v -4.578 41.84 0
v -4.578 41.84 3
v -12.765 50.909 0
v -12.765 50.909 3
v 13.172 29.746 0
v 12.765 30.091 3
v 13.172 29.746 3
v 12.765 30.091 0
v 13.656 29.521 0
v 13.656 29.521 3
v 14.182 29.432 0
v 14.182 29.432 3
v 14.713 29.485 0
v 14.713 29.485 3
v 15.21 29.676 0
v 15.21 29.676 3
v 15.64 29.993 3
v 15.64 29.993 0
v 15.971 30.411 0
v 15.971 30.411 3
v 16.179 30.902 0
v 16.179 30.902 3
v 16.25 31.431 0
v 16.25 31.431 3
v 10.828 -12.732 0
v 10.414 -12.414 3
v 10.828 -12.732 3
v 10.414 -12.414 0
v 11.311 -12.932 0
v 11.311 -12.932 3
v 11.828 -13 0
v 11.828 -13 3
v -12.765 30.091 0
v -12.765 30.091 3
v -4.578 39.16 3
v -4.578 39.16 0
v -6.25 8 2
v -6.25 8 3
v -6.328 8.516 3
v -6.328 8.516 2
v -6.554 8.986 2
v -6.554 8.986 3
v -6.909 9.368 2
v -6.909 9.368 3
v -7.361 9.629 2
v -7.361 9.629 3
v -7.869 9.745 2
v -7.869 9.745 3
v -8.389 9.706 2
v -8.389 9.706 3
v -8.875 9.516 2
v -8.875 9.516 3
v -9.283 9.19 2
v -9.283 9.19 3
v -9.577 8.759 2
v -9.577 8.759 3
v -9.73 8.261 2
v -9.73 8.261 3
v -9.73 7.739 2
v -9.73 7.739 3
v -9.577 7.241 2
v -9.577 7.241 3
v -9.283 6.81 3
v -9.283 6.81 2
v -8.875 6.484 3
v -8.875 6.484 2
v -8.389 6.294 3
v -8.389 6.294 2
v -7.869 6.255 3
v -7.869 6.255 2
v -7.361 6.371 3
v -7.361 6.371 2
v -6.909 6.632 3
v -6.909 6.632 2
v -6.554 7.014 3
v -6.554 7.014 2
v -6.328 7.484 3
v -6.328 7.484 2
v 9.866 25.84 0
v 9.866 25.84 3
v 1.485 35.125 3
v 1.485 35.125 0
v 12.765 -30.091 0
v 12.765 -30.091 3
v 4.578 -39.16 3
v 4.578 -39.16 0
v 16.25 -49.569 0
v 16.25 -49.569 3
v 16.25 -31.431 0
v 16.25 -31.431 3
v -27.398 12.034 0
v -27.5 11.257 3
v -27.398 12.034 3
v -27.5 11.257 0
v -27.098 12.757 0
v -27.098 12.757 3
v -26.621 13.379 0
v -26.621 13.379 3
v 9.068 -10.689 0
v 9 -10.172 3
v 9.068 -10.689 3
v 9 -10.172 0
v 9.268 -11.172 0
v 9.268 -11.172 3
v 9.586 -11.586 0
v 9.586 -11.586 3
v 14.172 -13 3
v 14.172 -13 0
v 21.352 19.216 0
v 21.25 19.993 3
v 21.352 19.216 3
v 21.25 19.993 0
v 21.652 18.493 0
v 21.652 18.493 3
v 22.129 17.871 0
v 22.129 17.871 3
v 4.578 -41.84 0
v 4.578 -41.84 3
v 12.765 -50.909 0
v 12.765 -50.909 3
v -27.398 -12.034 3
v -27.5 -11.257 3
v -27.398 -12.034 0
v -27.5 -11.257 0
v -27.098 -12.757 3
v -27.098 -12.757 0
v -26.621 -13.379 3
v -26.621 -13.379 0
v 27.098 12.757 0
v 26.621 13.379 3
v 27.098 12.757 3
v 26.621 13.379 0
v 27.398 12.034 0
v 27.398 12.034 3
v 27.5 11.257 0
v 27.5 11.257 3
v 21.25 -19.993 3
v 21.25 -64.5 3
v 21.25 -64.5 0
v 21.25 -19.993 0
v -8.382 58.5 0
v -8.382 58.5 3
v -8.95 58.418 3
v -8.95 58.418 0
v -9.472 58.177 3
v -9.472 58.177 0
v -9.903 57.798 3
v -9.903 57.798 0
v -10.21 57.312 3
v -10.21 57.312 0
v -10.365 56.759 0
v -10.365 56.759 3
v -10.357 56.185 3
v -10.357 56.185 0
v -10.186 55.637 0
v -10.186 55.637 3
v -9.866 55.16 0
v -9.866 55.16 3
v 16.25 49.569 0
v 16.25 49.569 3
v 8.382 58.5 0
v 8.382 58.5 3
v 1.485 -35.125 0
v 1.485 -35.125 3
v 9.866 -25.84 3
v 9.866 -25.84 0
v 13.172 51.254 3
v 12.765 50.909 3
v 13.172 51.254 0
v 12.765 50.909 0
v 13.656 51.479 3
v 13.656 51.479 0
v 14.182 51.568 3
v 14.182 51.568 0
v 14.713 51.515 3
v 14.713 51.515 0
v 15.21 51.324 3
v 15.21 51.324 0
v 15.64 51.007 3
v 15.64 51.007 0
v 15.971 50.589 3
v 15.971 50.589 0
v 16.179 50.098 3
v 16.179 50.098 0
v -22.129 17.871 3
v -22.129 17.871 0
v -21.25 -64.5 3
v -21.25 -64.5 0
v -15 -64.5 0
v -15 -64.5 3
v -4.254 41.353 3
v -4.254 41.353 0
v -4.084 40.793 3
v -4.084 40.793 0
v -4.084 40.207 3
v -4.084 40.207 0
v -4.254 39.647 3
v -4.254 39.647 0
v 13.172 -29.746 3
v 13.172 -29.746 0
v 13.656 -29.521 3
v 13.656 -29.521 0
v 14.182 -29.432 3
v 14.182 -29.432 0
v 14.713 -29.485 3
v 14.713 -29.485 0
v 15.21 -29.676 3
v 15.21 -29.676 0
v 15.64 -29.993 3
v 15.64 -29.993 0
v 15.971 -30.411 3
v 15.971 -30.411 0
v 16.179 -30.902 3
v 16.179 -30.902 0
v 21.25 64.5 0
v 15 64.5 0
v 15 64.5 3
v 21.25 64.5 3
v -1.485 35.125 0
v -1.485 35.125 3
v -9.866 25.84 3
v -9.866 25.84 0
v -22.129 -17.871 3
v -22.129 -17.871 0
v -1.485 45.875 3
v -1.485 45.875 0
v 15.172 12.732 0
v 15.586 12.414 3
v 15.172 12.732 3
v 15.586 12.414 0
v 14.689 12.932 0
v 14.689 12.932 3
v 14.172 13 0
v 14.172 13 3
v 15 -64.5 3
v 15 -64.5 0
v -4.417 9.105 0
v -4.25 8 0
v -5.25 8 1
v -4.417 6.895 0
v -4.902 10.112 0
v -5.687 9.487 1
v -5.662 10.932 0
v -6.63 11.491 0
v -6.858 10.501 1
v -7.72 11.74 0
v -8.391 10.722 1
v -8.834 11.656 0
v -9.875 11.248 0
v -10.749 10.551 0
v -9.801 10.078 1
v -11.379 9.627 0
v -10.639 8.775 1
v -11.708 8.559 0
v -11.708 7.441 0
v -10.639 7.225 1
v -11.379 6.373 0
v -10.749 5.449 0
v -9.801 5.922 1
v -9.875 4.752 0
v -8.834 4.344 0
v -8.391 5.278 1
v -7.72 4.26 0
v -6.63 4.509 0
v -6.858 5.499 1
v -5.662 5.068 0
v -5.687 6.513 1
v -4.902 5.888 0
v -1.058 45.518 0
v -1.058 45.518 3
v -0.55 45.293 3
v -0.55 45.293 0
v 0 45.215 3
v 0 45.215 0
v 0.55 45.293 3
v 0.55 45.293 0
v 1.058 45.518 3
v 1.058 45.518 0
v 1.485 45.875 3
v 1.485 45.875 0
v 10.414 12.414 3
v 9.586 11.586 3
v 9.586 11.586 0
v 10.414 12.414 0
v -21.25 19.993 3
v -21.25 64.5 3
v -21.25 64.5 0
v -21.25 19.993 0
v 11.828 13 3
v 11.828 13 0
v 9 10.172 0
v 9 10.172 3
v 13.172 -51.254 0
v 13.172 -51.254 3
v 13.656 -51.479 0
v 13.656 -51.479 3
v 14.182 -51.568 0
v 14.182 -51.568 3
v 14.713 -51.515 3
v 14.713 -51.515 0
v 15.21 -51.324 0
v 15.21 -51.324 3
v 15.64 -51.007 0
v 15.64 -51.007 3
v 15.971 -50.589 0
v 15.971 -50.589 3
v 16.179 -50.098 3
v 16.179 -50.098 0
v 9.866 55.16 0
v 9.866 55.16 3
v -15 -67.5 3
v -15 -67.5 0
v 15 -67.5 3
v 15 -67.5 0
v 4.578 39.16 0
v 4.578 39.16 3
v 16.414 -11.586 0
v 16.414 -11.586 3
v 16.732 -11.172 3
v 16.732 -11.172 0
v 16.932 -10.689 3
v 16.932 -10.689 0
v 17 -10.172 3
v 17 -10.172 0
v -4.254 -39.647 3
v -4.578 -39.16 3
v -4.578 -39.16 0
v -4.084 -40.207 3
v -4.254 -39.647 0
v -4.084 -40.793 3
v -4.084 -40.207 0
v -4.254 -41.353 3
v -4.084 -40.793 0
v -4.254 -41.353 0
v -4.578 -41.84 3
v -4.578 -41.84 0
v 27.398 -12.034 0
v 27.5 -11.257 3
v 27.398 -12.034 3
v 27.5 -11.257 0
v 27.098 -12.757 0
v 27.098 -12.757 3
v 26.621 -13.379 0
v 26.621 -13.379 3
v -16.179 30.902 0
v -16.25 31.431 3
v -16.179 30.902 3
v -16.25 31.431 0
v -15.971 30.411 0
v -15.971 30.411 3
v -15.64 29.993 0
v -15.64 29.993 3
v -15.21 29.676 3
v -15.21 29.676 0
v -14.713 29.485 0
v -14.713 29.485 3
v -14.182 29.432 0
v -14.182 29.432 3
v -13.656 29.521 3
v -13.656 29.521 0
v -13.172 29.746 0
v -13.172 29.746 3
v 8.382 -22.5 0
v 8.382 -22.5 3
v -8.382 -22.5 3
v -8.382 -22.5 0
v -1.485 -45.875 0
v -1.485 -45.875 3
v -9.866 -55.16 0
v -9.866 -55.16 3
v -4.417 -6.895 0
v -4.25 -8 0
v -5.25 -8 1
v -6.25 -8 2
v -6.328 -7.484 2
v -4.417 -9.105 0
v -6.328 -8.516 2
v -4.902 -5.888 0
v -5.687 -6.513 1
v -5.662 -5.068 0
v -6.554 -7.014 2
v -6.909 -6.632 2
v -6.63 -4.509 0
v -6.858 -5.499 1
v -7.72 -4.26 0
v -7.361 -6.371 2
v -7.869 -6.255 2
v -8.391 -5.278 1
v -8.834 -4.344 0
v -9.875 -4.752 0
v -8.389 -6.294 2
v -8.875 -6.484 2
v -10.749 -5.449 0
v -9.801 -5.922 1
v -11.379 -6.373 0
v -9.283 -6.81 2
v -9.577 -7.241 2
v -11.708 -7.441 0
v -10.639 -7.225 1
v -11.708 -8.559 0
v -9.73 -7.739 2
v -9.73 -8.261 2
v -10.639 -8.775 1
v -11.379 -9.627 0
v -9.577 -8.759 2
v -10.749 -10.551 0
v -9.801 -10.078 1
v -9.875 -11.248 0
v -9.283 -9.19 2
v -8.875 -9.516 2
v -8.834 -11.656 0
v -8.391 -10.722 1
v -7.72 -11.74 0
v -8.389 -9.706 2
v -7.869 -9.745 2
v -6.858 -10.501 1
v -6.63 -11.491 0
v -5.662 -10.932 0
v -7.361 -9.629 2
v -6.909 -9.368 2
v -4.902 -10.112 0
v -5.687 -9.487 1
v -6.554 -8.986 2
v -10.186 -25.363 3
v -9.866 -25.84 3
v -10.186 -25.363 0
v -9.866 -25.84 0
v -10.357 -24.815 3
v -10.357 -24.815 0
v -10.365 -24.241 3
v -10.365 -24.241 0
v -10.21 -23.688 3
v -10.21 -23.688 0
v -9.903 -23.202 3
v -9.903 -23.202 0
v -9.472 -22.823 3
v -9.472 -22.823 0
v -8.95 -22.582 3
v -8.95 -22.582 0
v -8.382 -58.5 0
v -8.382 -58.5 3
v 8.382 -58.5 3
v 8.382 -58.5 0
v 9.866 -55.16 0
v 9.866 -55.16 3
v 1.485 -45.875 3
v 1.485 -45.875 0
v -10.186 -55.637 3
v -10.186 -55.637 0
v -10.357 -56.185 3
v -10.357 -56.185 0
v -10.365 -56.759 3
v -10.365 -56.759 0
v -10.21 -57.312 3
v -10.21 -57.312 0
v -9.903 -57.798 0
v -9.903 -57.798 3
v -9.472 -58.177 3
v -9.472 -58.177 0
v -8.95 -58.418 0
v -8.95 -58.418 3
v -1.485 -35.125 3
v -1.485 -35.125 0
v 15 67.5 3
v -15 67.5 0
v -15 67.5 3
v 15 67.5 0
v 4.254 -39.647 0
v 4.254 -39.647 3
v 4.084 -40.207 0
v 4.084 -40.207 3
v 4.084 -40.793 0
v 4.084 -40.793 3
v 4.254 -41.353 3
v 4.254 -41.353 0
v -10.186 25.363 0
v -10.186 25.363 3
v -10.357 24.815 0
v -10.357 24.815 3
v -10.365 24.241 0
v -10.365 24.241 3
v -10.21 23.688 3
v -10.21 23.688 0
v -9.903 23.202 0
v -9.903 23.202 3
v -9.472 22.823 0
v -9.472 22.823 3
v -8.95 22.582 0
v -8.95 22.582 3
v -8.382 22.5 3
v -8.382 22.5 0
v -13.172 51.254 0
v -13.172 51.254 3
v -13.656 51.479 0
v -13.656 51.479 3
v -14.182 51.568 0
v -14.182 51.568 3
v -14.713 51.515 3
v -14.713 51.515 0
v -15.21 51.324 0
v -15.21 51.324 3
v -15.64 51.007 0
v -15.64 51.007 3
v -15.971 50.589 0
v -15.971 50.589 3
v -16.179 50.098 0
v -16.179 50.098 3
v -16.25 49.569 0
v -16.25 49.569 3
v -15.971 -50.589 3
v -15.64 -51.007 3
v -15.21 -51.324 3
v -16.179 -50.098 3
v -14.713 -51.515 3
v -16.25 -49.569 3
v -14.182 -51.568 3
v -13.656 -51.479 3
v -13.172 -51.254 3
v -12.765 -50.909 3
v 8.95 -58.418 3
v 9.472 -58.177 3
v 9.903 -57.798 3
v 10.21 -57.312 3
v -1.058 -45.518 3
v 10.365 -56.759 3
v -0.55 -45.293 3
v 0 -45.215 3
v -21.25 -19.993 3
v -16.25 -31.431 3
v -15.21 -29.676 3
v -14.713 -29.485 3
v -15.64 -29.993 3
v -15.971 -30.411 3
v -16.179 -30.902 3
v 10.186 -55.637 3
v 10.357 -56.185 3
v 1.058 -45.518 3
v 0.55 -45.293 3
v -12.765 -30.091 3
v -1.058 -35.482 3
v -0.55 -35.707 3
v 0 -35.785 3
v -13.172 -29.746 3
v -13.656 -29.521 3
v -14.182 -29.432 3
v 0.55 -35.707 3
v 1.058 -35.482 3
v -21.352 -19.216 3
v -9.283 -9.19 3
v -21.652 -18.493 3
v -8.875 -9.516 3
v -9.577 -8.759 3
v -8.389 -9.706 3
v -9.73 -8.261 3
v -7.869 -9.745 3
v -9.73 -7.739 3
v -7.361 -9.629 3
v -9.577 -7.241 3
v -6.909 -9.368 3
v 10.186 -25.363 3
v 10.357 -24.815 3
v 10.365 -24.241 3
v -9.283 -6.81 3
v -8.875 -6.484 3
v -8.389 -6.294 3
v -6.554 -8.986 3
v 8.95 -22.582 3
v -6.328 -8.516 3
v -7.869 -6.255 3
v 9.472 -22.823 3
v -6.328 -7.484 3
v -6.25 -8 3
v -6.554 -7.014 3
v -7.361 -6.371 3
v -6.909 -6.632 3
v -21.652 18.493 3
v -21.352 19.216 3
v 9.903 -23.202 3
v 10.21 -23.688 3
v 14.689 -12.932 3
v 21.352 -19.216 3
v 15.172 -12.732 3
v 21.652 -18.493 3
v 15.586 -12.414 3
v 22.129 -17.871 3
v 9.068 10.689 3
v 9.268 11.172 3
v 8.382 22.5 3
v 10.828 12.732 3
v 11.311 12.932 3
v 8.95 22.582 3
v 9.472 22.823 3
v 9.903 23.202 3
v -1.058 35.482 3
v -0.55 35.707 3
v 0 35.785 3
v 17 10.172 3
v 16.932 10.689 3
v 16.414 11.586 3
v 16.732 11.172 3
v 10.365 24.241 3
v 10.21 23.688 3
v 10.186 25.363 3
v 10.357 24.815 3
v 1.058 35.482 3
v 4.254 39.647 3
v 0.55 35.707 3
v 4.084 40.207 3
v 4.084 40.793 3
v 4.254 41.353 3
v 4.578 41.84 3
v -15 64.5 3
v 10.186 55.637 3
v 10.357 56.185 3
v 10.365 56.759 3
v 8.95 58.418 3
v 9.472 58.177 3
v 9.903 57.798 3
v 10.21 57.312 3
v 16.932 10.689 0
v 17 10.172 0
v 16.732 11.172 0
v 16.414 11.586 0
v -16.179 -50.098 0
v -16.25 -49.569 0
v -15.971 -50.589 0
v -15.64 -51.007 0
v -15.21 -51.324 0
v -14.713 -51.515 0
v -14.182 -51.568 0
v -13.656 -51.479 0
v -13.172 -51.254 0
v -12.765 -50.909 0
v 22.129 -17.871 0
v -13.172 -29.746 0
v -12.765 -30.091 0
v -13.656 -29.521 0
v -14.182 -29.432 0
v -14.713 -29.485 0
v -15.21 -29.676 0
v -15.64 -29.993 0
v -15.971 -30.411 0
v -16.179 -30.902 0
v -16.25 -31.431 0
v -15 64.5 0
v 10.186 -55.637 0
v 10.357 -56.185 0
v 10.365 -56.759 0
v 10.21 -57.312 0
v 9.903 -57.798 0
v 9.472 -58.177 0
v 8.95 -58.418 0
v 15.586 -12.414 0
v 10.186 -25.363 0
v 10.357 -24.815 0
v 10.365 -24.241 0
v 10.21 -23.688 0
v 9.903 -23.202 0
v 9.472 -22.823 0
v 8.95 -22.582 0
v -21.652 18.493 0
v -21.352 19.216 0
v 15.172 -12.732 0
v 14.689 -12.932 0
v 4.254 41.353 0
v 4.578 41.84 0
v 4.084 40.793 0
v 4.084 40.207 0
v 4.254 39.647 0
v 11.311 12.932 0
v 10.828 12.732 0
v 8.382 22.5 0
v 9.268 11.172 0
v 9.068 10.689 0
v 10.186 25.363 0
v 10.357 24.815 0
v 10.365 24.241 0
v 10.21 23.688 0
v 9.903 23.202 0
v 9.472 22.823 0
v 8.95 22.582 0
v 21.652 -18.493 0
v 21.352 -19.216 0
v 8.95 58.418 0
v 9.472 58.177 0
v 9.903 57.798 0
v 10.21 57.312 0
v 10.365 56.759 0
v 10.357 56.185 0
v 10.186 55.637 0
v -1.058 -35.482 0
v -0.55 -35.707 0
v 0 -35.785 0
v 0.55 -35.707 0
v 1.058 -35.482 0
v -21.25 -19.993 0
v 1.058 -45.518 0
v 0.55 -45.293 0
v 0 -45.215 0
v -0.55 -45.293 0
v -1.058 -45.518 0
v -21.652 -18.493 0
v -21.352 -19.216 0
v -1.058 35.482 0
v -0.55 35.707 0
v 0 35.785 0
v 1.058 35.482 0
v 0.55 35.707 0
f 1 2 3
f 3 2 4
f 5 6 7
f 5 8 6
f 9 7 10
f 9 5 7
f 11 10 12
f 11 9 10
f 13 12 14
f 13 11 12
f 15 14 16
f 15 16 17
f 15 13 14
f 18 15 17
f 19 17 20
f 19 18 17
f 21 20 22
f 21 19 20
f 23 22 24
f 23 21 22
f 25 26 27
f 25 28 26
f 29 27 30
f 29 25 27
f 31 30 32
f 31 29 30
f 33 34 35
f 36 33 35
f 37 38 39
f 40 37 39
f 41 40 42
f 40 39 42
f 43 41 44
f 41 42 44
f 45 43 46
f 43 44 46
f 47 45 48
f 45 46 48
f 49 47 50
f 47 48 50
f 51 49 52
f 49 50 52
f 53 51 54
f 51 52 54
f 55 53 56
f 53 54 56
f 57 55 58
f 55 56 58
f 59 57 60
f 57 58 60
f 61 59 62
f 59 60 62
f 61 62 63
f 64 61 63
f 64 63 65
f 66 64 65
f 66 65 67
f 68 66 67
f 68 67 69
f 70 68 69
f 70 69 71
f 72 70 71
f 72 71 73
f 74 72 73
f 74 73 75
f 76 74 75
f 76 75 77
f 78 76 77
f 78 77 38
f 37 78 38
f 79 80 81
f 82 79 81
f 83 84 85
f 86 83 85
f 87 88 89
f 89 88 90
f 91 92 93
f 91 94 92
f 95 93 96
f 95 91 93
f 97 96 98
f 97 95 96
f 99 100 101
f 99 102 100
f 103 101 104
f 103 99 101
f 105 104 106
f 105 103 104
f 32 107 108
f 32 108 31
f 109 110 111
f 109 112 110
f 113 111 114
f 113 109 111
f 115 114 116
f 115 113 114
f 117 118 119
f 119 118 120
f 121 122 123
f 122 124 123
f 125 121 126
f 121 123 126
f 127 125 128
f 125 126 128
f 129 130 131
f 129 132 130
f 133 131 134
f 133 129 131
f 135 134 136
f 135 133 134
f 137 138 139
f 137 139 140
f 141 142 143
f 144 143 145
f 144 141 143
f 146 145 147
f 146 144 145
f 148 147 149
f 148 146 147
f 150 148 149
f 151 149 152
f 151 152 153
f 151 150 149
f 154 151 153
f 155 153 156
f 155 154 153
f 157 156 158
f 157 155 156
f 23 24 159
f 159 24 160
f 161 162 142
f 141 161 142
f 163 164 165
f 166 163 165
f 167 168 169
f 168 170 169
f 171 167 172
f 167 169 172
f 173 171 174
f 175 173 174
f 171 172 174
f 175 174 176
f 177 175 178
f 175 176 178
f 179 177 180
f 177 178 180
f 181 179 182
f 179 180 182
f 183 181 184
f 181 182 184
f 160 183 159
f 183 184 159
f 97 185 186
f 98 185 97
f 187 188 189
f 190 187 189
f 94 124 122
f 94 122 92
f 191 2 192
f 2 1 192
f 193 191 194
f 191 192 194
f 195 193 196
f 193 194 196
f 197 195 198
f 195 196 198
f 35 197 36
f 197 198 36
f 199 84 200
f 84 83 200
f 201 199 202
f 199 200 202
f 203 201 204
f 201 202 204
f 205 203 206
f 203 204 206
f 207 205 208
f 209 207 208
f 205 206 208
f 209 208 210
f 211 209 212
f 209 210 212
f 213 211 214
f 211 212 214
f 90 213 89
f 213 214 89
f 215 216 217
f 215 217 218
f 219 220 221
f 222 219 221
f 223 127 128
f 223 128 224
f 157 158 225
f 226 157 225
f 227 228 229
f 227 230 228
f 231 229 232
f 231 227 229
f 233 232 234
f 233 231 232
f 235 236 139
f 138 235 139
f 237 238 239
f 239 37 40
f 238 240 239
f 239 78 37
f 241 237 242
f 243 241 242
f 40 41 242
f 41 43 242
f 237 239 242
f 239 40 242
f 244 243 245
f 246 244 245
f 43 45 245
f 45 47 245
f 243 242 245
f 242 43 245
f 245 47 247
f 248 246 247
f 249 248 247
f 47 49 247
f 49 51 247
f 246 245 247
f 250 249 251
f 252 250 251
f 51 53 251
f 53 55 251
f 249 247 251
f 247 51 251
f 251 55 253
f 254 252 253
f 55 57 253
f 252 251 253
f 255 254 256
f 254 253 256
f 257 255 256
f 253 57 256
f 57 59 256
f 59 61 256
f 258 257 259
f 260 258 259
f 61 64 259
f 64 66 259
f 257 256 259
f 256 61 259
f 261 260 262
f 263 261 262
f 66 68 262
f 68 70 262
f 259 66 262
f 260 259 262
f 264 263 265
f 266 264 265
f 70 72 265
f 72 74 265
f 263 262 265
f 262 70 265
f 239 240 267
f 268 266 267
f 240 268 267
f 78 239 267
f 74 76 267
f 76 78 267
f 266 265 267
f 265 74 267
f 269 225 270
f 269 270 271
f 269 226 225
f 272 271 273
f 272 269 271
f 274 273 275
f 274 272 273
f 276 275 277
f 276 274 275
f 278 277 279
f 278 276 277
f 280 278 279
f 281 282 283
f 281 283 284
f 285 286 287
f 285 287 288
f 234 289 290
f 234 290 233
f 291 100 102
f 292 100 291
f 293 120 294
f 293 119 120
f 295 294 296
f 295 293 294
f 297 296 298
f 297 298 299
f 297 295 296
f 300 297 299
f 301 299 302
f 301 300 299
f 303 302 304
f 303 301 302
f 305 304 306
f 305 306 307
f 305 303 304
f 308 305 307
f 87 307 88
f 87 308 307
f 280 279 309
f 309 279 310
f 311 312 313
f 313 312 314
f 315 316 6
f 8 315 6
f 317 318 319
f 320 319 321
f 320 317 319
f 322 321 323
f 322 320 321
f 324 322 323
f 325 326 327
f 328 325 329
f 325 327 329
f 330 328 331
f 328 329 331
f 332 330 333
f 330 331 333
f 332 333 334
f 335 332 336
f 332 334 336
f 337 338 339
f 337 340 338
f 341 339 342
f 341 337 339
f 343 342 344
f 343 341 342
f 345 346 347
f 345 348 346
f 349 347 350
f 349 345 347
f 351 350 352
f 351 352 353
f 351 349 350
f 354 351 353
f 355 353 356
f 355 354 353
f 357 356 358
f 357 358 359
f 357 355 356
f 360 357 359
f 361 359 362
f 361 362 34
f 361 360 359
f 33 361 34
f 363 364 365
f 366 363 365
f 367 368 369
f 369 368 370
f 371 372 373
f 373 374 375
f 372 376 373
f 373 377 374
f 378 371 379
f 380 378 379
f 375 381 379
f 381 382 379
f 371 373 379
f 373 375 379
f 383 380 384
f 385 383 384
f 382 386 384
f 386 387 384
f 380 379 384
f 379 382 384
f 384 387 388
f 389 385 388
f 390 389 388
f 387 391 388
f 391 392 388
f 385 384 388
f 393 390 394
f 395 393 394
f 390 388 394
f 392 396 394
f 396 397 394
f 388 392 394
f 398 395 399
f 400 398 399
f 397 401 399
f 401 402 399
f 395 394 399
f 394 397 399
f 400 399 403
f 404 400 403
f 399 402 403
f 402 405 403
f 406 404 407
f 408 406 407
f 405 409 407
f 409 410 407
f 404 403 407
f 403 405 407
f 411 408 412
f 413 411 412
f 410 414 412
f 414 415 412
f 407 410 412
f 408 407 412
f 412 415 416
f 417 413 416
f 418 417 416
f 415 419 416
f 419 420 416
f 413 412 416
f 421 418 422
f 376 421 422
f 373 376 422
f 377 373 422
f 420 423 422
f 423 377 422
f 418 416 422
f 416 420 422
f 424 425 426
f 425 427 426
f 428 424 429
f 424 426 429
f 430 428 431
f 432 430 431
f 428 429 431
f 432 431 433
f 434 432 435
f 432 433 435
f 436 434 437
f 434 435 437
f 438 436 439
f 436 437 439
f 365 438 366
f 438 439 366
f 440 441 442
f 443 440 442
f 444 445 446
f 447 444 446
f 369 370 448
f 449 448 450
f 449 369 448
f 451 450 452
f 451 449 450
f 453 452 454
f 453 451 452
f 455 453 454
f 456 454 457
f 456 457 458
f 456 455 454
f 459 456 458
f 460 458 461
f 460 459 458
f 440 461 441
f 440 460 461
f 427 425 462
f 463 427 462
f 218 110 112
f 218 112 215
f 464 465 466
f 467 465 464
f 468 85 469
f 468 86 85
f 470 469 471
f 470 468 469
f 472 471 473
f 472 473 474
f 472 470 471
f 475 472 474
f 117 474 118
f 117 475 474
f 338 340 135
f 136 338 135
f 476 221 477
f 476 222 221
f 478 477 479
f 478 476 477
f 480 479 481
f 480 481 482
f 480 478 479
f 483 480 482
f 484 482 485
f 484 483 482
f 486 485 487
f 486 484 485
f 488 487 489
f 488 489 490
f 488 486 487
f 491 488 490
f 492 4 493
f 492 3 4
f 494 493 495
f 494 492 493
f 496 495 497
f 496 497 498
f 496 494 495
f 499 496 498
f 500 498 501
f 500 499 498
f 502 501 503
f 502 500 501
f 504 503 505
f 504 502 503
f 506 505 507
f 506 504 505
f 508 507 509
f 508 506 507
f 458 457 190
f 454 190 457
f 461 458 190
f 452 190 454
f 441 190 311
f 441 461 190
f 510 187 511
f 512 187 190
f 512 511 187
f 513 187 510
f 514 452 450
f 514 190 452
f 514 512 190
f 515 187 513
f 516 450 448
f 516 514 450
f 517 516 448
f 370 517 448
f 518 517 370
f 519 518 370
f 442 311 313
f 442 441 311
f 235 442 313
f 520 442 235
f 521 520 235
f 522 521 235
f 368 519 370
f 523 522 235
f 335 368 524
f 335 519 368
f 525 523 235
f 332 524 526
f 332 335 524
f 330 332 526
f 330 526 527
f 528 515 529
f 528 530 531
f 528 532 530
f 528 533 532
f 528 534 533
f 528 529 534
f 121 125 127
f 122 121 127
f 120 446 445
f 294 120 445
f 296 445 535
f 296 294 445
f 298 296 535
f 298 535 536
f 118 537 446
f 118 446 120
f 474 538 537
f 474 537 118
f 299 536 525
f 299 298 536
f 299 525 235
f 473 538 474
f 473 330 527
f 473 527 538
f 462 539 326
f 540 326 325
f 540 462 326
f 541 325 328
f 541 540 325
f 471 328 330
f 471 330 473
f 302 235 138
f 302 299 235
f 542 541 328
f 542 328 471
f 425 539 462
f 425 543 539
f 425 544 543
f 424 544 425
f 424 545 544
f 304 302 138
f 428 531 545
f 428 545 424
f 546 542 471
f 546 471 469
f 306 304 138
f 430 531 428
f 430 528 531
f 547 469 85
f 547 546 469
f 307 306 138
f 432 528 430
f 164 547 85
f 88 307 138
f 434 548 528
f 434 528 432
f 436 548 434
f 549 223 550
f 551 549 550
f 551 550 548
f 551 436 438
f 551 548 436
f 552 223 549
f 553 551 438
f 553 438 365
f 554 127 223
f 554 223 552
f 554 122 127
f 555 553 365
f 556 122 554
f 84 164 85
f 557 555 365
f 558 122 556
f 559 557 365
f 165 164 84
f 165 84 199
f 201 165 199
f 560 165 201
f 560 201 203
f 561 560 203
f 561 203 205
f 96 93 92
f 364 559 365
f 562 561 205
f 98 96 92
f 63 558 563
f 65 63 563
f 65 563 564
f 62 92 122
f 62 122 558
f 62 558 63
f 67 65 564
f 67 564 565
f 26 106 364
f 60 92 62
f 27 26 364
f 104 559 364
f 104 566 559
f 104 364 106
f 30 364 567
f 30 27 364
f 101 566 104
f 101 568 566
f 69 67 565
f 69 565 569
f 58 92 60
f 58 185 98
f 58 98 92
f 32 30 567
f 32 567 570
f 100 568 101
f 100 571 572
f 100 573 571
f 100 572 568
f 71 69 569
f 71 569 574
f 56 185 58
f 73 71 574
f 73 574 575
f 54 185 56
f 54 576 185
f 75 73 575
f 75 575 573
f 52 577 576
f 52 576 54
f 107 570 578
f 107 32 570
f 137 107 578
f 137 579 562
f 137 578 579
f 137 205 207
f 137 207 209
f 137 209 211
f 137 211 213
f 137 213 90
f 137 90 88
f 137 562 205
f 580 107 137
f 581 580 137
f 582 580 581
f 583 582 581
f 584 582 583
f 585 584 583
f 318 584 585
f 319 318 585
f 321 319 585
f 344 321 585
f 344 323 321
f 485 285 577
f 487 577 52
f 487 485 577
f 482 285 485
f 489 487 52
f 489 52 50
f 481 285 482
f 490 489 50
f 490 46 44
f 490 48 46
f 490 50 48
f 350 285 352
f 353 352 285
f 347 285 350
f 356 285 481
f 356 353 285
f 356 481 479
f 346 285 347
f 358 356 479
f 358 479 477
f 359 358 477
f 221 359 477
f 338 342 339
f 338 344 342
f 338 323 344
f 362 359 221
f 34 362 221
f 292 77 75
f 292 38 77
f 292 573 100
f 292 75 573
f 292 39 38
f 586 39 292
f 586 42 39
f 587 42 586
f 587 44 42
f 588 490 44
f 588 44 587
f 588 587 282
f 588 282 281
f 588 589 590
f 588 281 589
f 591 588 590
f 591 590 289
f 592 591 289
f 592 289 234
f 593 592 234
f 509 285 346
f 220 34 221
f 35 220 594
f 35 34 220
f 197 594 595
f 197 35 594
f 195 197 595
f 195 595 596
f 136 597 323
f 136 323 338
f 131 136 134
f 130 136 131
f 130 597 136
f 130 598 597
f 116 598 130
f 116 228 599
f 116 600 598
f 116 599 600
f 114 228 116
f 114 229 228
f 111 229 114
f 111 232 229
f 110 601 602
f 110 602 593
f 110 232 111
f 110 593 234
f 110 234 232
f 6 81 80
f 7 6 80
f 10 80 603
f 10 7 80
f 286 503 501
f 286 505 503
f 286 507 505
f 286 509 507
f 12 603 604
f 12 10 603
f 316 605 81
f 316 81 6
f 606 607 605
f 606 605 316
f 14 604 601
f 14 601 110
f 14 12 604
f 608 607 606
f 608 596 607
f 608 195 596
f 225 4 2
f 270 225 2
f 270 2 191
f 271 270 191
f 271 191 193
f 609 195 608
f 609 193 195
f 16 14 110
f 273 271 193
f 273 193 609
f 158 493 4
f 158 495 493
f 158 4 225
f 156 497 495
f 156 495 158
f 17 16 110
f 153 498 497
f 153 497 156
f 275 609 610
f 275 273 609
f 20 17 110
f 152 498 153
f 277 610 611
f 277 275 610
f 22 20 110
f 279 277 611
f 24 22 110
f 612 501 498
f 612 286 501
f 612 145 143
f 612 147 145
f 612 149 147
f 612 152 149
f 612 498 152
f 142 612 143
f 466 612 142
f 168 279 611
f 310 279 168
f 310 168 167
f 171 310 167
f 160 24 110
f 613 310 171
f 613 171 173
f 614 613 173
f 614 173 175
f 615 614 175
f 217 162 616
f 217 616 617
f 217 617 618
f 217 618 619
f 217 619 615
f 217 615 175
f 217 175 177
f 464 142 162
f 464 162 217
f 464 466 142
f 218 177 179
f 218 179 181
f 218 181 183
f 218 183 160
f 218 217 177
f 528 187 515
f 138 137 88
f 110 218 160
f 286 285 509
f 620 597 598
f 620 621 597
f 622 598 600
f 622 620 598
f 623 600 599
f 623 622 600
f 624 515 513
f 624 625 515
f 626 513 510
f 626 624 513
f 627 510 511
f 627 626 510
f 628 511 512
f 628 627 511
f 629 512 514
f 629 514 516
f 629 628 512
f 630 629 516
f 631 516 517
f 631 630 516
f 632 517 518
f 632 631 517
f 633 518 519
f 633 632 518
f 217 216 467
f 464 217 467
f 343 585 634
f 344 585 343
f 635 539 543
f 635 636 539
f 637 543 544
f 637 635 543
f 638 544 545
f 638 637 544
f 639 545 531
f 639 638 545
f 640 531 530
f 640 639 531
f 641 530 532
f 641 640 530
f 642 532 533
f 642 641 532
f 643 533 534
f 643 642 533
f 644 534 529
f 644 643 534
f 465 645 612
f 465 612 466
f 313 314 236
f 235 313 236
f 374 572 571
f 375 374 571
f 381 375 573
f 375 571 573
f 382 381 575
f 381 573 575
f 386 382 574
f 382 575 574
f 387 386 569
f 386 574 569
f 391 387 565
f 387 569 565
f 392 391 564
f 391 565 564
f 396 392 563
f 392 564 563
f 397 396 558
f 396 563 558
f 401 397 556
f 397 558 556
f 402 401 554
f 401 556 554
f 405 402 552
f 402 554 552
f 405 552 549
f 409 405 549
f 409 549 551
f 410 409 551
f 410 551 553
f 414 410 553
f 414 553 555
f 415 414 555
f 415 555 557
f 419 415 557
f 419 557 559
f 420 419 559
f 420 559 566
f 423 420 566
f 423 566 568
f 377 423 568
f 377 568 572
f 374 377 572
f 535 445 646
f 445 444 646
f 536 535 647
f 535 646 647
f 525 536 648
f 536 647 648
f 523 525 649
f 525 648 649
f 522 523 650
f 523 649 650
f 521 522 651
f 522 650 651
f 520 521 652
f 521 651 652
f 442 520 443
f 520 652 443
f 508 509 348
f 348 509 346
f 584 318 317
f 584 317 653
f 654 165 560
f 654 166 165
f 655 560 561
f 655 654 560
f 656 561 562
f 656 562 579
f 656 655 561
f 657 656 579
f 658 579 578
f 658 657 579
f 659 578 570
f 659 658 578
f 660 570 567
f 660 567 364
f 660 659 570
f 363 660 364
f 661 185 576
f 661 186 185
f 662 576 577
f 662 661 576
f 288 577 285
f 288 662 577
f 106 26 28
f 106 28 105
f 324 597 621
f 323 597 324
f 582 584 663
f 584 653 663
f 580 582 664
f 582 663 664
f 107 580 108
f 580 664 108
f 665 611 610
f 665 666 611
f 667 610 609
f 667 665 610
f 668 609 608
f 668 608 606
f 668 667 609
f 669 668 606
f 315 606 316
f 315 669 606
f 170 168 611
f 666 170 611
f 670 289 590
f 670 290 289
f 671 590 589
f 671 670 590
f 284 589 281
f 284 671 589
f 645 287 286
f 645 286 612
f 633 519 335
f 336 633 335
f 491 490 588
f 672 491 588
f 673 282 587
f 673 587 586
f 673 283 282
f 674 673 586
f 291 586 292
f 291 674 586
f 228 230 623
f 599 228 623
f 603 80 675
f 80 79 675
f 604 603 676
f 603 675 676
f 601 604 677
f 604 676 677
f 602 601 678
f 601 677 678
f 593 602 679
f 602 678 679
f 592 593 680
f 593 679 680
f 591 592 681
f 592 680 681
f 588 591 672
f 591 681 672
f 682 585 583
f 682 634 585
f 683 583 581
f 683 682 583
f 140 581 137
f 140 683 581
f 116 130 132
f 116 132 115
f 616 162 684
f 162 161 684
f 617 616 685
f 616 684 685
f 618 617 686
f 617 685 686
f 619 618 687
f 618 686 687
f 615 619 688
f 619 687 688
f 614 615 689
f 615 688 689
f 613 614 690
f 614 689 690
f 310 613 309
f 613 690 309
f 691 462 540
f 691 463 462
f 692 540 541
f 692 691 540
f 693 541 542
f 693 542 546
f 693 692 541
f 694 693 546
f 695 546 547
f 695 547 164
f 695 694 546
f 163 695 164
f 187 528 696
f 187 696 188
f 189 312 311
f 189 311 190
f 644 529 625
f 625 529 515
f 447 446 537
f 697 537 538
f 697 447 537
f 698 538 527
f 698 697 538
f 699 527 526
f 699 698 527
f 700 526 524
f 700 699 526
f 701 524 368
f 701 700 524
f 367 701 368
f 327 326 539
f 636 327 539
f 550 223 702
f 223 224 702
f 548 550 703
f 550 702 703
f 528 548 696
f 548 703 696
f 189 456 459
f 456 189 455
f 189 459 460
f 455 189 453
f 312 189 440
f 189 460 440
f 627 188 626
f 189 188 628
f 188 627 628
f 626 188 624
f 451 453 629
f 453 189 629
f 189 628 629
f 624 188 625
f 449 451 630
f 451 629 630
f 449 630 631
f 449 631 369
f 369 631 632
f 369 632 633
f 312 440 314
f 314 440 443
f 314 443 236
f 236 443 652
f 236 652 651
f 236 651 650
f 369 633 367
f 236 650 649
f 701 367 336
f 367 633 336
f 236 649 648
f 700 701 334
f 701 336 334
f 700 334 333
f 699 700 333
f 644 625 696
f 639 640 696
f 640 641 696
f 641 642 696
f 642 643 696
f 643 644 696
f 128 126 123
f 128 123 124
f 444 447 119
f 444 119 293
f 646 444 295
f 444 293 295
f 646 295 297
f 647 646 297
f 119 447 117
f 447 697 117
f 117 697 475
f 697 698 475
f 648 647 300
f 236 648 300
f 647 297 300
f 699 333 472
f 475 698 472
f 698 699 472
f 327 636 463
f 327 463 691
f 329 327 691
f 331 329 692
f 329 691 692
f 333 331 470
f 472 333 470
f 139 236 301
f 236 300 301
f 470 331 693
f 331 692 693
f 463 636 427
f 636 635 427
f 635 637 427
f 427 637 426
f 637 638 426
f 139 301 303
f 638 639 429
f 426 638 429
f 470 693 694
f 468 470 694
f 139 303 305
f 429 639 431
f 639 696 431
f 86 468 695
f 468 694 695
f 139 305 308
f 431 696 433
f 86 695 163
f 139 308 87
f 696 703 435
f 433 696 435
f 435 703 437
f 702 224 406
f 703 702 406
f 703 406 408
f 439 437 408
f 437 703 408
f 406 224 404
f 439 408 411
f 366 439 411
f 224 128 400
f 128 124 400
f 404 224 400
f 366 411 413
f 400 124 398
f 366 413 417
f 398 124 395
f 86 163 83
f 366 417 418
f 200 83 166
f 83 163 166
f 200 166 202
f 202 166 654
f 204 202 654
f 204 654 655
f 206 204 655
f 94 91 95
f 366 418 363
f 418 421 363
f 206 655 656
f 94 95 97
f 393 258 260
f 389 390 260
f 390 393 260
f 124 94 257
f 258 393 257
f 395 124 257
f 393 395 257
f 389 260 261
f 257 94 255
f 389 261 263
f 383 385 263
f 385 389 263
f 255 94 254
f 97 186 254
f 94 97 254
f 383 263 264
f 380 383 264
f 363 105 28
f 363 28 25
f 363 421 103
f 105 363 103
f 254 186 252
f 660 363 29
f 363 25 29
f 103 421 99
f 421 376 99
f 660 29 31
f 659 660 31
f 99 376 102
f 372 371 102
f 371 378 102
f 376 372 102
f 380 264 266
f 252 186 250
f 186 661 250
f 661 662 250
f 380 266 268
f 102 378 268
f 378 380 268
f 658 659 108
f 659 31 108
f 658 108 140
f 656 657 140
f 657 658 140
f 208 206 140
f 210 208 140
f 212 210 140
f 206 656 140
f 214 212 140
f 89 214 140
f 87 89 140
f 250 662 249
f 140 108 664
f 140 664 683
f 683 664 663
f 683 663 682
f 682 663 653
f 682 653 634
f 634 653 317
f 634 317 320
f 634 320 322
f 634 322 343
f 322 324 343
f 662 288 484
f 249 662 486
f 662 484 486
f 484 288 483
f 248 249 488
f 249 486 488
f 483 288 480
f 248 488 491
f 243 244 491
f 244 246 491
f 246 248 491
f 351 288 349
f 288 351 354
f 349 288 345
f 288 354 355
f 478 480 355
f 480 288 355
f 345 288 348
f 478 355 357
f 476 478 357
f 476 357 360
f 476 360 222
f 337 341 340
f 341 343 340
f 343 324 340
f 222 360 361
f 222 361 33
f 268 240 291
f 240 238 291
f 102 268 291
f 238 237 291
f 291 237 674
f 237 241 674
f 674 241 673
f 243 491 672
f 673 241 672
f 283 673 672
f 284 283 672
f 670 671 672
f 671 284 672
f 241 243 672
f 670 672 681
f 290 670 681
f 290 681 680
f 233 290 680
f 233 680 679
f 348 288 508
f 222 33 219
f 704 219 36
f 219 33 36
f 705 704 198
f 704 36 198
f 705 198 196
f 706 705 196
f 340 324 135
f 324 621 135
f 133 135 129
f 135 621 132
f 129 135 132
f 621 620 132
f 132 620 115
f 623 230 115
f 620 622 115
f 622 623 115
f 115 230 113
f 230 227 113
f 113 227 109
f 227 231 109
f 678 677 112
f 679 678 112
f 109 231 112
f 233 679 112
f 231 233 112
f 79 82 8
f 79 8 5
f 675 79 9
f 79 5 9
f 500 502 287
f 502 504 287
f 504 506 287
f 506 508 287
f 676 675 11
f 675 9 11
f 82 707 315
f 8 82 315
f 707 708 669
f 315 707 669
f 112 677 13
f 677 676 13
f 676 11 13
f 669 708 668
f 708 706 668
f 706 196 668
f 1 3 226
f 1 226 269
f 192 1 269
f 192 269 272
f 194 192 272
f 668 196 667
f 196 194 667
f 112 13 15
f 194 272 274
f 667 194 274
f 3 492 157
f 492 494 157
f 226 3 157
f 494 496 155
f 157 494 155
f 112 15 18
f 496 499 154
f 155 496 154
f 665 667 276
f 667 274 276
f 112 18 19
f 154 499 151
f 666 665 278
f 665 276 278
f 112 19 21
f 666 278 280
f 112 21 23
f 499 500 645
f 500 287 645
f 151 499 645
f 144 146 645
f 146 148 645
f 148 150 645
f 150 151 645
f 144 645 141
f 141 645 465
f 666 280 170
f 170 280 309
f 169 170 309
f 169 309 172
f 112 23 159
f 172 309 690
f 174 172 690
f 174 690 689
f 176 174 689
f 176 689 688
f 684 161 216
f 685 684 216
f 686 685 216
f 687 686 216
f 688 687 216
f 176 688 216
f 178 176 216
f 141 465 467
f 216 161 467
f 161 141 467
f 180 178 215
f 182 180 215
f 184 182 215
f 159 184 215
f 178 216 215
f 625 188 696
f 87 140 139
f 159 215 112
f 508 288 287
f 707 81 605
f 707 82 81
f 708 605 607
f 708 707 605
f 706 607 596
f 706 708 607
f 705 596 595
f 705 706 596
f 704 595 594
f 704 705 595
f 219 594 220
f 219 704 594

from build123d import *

# Parameters (mm, degrees)
SKETCH_1_W          = 55
SKETCH_1_H          = 129
SKETCH_1_W_2        = 30
SKETCH_1_H_2        = 6
EXTRUDE_1_DEPTH     = 3
SKETCH_2_R          = 1.75
CUT_EXTRUDE_1_DEPTH = 10
CUT_EXTRUDE_2_DEPTH = 10
FILLET_1_R          = 3
CHAMFER_1_SIZE      = 2
CUT_EXTRUDE_3_DEPTH = 10
FILLET_2_R          = 2


with BuildPart() as part:
    # Эскиз1 → Бобышка-Вытянуть1 (new body)
    with BuildSketch(Plane.XY):
        Rectangle(SKETCH_1_W, SKETCH_1_H)
        with Locations((0, 64.5)):
            Rectangle(SKETCH_1_W_2, SKETCH_1_H_2)
        with Locations((0, -64.5)):
            Rectangle(SKETCH_1_W_2, SKETCH_1_H_2)
    extrude(amount=EXTRUDE_1_DEPTH)

    # Эскиз2 → Вырез-Вытянуть1 (cut)
    with BuildSketch(Plane.XY.offset(3)):
        with Locations((-8, 8)):
            Circle(SKETCH_2_R)
        with Locations((-8, -8)):
            Circle(SKETCH_2_R)
    extrude(amount=-CUT_EXTRUDE_1_DEPTH, mode=Mode.SUBTRACT)

    # Эскиз3 → Вырез-Вытянуть2 (cut)
    with BuildSketch(Plane.XY.offset(3)):
        Polygon((-21.25, 64.5), (-21.25, 18.75), (-27.5, 12.5), (-35.562933311, 12.5), (-37.53189801, 71.38735117), align=None)
        Polygon((35.562933311, 12.5), (27.5, 12.5), (21.25, 18.75), (21.25, 64.5), (37.53189801, 71.38735117), align=None)
        Polygon((21.25, -64.5), (21.25, -18.75), (27.5, -12.5), (35.562933311, -12.5), (37.53189801, -71.38735117), align=None)
        Polygon((-35.562933311, -12.5), (-27.5, -12.5), (-21.25, -18.75), (-21.25, -64.5), (-37.53189801, -71.38735117), align=None)
    extrude(amount=-CUT_EXTRUDE_2_DEPTH, mode=Mode.SUBTRACT)

    # Скругление1
    fillet_1_edges = [part.edges().sort_by_distance(p)[0] for p in [
        (-21.25, 18.75, 1.5),
        (-27.5, 12.5, 1.5),
        (-27.5, -12.5, 1.5),
        (-21.25, -18.75, 1.5),
        (21.25, -18.75, 1.5),
        (27.5, -12.5, 1.5),
        (27.5, 12.5, 1.5),
        (21.25, 18.75, 1.5),
    ]]
    fillet(fillet_1_edges, radius=FILLET_1_R)

    # Фаска1
    chamfer_1_edges = [part.edges().sort_by_distance(p)[0] for p in [
        (-9.75, 8, 0),
        (-9.75, -8, 0),
    ]]
    chamfer(chamfer_1_edges, length=CHAMFER_1_SIZE)

    # Эскиз4 → Вырез-Вытянуть3 (cut)
    with BuildSketch(Plane.XY.offset(3)):
        Polygon((12.881944444, 22.5), (0, 36.769230769), (-12.881944444, 22.5), align=None)
        Polygon((-3.368055556, 40.5), (-16.25, 54.769230769), (-16.25, 26.230769231), align=None)
        Polygon((12.881944444, 58.5), (-12.881944444, 58.5), (0, 44.230769231), align=None)
        Polygon((16.25, 54.769230769), (3.368055556, 40.5), (16.25, 26.230769231), align=None)
        Polygon((15, -13), (11, -13), (9, -11), (9, 11), (11, 13), (15, 13), (17, 11), (17, -11), align=None)
        Polygon((-12.881944444, -22.5), (0, -36.769230769), (12.881944444, -22.5), align=None)
        Polygon((16.25, -26.230769231), (3.368055556, -40.5), (16.25, -54.769230769), align=None)
        Polygon((12.881944444, -58.5), (0, -44.230769231), (-12.881944444, -58.5), align=None)
        Polygon((-3.368055556, -40.5), (-16.25, -26.230769231), (-16.25, -54.769230769), align=None)
    extrude(amount=-CUT_EXTRUDE_3_DEPTH, mode=Mode.SUBTRACT)

    # Скругление2
    fillet_2_edges = [part.edges().sort_by_distance(p)[0] for p in [
        (16.25, -54.769230769, 1.5),
        (3.368055556, -40.5, 1.5),
        (16.25, -26.230769231, 1.5),
        (-12.881944444, -22.5, 1.5),
        (12.881944444, -22.5, 1.5),
        (0, -36.769230769, 1.5),
        (-16.25, -54.769230769, 1.5),
        (-16.25, -26.230769231, 1.5),
        (-3.368055556, -40.5, 1.5),
        (-12.881944444, -58.5, 1.5),
        (0, -44.230769231, 1.5),
        (12.881944444, -58.5, 1.5),
        (0, 44.230769231, 1.5),
        (-12.881944444, 58.5, 1.5),
        (12.881944444, 58.5, 1.5),
        (-16.25, 26.230769231, 1.5),
        (-16.25, 54.769230769, 1.5),
        (-3.368055556, 40.5, 1.5),
        (3.368055556, 40.5, 1.5),
        (16.25, 54.769230769, 1.5),
        (16.25, 26.230769231, 1.5),
        (15, -13, 1.5),
        (11, -13, 1.5),
        (9, -11, 1.5),
        (9, 11, 1.5),
        (11, 13, 1.5),
        (15, 13, 1.5),
        (17, 11, 1.5),
        (17, -11, 1.5),
        (-12.881944444, 22.5, 1.5),
        (0, 36.769230769, 1.5),
        (12.881944444, 22.5, 1.5),
    ]]
    fillet(fillet_2_edges, radius=FILLET_2_R)


solid = part.part
